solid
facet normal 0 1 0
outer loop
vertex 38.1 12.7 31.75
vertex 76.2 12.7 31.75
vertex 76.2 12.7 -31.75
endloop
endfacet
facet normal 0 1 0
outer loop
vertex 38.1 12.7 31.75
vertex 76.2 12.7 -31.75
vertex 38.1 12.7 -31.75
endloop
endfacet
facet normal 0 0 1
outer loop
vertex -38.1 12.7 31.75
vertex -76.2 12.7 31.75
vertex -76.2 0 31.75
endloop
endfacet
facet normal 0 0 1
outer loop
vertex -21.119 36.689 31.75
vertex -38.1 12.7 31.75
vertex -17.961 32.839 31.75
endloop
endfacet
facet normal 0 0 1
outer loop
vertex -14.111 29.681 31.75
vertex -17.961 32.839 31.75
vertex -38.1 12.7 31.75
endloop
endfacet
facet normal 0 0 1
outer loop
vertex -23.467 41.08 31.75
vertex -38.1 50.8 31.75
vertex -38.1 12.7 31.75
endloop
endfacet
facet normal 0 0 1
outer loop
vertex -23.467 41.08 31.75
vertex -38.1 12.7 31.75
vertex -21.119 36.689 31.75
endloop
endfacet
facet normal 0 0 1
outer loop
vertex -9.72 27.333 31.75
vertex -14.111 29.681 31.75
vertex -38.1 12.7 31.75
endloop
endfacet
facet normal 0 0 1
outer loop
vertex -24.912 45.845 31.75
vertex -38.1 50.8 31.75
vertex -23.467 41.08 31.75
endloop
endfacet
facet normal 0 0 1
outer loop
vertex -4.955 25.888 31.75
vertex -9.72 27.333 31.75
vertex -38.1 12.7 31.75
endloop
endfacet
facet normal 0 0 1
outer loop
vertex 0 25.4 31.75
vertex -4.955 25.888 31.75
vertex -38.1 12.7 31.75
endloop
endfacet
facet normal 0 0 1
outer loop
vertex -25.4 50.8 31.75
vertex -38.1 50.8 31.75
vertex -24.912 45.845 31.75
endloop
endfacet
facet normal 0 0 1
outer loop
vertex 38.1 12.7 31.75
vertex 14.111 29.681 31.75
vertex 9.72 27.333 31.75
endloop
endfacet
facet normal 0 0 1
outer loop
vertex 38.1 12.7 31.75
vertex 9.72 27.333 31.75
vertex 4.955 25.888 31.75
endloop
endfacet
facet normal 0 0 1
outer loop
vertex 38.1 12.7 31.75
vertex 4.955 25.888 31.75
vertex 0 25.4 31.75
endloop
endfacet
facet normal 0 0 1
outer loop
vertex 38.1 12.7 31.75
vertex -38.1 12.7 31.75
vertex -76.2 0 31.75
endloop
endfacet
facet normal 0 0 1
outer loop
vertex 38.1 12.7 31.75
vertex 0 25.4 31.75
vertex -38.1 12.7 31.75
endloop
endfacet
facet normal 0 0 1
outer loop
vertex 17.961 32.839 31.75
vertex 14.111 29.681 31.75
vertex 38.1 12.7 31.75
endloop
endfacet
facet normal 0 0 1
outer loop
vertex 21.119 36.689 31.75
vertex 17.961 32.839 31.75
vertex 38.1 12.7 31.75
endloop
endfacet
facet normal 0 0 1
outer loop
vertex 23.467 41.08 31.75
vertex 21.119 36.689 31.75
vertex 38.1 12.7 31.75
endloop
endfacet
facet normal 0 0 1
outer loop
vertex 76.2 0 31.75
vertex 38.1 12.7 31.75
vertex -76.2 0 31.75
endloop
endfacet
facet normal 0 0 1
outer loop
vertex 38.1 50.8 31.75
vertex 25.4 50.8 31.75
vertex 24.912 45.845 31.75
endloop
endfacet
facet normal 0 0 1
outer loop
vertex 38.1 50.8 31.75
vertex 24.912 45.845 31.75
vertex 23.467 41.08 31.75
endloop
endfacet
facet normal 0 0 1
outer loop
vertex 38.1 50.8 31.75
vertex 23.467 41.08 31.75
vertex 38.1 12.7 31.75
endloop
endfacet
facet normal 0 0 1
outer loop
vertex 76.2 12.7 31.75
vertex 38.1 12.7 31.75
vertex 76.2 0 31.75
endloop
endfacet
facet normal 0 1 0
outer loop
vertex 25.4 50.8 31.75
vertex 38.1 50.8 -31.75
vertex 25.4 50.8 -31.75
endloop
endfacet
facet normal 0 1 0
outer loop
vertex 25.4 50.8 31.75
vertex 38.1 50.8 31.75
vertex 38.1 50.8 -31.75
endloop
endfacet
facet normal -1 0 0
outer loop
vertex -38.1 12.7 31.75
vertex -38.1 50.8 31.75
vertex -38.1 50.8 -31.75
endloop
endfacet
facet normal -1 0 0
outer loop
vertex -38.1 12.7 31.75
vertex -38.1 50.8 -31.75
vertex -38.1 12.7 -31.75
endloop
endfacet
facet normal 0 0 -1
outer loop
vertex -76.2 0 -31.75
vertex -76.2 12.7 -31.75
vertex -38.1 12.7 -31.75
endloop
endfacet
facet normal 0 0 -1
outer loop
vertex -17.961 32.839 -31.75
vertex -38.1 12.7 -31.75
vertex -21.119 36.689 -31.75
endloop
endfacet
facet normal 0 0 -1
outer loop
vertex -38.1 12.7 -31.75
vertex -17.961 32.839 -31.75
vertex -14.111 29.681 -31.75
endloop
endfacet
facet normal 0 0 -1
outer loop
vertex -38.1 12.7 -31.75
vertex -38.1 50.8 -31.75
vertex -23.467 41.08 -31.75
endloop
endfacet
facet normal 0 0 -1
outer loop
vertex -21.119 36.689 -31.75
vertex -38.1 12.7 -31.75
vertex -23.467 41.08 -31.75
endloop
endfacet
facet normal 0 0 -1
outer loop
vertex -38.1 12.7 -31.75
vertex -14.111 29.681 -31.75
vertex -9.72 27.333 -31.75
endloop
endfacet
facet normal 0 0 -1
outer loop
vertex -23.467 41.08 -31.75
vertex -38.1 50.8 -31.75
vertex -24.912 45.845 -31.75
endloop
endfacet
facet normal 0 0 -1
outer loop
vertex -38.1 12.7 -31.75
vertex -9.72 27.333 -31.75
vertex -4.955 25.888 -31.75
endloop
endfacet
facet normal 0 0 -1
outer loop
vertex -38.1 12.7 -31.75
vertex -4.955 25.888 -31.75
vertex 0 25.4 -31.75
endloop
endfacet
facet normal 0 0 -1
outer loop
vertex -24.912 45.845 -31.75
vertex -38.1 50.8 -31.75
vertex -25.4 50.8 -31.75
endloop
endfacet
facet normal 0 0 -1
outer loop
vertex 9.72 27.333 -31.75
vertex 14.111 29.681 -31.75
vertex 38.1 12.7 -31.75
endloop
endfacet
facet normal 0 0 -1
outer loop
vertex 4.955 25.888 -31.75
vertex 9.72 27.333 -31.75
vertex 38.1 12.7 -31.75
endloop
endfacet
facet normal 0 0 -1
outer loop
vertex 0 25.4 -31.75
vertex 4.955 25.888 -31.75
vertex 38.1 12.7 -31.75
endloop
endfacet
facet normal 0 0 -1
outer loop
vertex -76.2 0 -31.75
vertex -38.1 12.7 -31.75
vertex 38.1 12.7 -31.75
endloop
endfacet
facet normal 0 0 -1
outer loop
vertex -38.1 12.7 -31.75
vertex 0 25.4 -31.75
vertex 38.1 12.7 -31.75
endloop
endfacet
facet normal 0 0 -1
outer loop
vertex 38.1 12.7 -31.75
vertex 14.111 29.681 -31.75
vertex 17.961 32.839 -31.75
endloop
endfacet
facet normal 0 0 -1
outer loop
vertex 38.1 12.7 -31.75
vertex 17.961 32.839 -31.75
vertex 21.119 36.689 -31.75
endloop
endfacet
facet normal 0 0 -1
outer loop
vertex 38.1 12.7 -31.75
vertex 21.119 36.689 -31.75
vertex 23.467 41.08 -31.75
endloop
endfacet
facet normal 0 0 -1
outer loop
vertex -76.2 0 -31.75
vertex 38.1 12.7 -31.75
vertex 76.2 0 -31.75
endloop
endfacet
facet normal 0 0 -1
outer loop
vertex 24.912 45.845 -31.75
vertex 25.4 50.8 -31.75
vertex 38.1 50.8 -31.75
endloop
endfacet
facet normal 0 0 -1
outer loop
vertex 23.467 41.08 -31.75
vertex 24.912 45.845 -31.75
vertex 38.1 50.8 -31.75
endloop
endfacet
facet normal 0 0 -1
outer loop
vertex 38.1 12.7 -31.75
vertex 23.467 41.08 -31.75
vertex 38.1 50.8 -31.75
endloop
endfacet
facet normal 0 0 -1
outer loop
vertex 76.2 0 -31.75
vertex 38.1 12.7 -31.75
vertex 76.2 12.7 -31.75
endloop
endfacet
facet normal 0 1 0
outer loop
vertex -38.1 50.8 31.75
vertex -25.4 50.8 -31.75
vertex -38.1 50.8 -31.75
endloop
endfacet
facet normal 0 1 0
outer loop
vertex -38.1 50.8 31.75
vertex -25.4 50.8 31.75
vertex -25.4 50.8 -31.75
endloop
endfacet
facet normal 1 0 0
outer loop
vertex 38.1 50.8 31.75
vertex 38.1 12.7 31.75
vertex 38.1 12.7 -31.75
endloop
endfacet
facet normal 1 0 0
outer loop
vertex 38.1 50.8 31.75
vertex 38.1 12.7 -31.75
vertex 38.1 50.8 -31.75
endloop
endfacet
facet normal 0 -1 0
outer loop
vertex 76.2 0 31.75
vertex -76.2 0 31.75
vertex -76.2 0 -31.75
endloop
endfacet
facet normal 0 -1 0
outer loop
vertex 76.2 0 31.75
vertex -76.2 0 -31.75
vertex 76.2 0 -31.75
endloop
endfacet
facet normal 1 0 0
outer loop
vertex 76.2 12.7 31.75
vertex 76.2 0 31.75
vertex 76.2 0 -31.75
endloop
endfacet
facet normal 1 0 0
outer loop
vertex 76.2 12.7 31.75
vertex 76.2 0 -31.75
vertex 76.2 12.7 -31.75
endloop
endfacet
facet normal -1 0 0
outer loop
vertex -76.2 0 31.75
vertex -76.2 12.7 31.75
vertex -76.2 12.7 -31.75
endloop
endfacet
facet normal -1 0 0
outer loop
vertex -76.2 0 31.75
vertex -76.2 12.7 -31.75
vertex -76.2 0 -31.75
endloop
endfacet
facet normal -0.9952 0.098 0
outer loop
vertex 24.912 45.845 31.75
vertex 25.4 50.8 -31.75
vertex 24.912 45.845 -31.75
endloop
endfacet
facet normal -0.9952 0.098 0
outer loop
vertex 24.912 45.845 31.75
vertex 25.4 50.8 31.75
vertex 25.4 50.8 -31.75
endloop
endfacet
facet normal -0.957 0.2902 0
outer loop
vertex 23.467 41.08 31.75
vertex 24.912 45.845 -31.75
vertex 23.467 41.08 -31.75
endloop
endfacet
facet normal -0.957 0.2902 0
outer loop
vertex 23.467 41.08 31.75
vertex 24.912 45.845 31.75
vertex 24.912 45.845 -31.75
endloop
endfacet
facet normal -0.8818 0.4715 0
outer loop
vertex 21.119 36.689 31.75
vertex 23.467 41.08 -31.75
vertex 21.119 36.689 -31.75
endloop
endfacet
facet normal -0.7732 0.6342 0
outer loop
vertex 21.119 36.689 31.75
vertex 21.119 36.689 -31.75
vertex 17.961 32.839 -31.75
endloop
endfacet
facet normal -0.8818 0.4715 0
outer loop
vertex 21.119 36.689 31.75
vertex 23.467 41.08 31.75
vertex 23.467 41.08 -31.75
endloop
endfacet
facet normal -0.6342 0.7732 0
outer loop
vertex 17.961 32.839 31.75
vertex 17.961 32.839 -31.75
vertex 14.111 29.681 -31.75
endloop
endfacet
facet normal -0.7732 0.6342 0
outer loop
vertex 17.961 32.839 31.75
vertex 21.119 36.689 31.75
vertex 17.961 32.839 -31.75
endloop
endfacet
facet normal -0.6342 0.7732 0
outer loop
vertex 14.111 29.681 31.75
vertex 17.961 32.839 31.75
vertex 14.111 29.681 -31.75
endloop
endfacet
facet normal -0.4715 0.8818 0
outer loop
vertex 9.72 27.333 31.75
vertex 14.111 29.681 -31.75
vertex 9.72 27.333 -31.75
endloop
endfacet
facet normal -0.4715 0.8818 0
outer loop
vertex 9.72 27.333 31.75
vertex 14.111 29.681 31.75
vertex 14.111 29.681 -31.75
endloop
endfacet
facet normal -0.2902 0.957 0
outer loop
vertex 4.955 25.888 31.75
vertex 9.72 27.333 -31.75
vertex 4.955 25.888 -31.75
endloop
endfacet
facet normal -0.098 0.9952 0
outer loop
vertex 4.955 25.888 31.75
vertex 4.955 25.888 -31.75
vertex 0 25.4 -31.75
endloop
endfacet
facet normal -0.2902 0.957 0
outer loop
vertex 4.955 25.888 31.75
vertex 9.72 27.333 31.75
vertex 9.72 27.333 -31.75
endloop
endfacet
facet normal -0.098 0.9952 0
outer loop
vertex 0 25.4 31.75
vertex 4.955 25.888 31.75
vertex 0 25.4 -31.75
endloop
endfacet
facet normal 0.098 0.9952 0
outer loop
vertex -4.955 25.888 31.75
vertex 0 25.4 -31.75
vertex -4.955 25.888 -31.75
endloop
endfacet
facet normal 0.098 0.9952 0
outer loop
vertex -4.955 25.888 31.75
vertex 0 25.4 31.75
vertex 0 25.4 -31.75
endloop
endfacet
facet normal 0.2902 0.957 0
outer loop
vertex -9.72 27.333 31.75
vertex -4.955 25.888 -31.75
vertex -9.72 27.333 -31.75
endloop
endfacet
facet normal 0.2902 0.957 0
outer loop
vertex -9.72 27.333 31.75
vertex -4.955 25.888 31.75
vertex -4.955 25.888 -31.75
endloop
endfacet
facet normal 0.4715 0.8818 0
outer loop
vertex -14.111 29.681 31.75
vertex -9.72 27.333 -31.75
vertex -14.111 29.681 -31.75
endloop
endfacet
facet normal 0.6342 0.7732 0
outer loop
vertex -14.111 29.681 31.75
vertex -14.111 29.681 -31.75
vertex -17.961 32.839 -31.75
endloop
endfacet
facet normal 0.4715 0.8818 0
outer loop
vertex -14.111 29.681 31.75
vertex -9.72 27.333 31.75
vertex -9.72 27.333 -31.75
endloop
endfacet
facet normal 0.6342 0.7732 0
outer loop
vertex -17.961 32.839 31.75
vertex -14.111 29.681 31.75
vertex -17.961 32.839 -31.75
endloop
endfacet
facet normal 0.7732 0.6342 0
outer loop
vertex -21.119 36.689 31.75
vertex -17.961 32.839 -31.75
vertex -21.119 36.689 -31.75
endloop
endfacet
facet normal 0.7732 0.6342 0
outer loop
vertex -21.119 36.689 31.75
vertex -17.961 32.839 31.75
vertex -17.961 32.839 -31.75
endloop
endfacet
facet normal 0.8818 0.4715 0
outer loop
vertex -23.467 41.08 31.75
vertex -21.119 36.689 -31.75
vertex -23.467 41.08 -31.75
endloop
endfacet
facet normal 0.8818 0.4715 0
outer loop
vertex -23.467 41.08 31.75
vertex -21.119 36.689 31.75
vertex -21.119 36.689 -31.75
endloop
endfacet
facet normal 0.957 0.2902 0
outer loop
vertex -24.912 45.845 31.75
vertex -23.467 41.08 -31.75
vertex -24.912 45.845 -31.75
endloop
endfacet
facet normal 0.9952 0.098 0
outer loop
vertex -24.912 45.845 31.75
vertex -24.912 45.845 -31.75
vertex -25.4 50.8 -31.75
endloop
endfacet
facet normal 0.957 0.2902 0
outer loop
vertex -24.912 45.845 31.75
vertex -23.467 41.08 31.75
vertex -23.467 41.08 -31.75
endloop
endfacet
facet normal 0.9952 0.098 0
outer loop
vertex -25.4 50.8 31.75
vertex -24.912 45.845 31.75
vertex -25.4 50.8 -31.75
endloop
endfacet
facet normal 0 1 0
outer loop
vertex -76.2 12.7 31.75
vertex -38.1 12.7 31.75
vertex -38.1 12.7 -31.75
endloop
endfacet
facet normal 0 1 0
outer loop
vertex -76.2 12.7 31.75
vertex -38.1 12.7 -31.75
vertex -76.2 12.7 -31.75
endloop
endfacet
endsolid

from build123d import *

# Parameters (mm, degrees)
BOSS_EXTRUDE1_DEPTH = 31.75


with BuildPart() as part:
    # Sketch2 → Boss-Extrude1 (new, symmetric)
    with BuildSketch(Plane.XY):
        with BuildLine():
            Line((-25.4, 50.8), (-38.1, 50.8))
            Line((-38.1, 50.8), (-38.1, 12.7))
            Line((-38.1, 12.7), (-76.2, 12.7))
            Line((-76.2, 12.7), (-76.2, 0))
            Line((-76.2, 0), (76.2, 0))
            Line((76.2, 0), (76.2, 12.7))
            Line((76.2, 12.7), (38.1, 12.7))
            Line((38.1, 12.7), (38.1, 50.8))
            Line((38.1, 50.8), (25.4, 50.8))
            ThreePointArc((25.4, 50.8), (0, 25.4), (-25.4, 50.8))
        make_face()
    extrude(amount=BOSS_EXTRUDE1_DEPTH, both=True)


solid = part.part
